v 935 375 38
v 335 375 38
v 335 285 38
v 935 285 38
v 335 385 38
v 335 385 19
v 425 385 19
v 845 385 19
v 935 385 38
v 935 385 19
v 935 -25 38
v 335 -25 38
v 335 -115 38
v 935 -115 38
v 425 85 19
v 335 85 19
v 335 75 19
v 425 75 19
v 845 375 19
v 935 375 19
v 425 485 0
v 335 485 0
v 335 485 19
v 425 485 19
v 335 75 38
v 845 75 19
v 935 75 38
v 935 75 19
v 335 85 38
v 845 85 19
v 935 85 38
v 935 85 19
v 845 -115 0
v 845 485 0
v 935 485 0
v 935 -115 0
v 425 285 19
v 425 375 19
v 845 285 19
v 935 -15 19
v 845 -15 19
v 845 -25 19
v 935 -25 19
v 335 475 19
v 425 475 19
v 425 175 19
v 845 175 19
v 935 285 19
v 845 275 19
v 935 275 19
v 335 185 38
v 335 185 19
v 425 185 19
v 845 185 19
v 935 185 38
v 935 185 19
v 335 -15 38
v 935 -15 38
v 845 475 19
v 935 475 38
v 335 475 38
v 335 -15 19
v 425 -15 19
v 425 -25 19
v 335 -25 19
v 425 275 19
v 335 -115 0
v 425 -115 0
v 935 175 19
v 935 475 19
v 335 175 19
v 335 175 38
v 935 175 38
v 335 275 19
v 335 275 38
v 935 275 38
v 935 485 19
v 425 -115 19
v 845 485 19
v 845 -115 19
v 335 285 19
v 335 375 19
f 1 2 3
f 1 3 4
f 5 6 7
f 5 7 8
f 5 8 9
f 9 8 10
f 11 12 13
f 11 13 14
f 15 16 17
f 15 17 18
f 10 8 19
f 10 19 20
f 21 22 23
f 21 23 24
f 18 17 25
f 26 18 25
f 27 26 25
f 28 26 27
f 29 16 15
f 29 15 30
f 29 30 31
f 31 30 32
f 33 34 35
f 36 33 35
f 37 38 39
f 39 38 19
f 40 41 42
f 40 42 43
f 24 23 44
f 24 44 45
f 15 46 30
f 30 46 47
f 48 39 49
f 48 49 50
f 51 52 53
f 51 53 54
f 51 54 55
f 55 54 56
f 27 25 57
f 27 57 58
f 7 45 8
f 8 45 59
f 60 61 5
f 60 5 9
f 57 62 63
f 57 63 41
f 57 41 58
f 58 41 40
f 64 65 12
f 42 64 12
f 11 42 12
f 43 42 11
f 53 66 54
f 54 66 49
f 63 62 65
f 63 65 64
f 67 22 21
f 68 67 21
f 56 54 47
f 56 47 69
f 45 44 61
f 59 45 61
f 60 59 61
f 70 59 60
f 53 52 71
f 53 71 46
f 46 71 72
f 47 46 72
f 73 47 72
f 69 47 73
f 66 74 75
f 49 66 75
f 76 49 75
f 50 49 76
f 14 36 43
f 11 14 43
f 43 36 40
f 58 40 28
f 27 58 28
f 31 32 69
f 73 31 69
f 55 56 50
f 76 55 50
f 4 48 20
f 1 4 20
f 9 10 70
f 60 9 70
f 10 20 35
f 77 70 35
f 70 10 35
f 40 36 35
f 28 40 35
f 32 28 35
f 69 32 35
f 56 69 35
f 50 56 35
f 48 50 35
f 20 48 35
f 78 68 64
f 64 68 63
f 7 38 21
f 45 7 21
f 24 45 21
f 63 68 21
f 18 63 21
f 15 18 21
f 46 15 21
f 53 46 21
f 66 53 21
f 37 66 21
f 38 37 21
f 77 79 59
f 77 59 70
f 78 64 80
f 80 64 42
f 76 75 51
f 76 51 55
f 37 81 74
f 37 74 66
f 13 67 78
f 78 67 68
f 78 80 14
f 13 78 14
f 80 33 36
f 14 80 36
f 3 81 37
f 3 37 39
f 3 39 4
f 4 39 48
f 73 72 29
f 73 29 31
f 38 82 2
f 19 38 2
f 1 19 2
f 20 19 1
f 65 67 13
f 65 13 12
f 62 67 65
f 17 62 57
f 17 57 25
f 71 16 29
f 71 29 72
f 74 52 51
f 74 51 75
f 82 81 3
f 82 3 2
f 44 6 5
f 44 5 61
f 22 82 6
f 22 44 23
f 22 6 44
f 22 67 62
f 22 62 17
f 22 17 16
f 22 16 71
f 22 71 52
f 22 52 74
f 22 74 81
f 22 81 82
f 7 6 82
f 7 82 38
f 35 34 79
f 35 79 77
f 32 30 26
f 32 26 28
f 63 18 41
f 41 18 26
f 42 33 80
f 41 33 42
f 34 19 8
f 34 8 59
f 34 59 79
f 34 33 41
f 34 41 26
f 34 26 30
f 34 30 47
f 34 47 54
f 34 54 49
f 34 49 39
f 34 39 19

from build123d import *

# Parameters (mm, degrees)
BOX077_W     = 600
BOX077_H     = 90
BOX077_DEPTH = 19
BOX076_W     = 600
BOX076_H     = 90
BOX076_DEPTH = 19
BOX082_W     = 90
BOX082_H     = 600
BOX082_DEPTH = 19
BOX079_W     = 600
BOX079_H     = 90
BOX079_DEPTH = 19
BOX078_W     = 600
BOX078_H     = 90
BOX078_DEPTH = 19
BOX081_W     = 600
BOX081_H     = 90
BOX081_DEPTH = 19
BOX080_W     = 600
BOX080_H     = 90
BOX080_DEPTH = 19
BOX083_W     = 90
BOX083_H     = 600
BOX083_DEPTH = 19


with BuildPart() as cube049:
    # Box077 → Box077 (new body)
    with BuildSketch(Plane(origin=(0, 100, 0), x_dir=(1, 0, 0), z_dir=(0, 0, 1))):
        with Locations((300, 45)):
            Rectangle(BOX077_W, BOX077_H)
    extrude(amount=BOX077_DEPTH)


with BuildPart() as cube048:
    # Box076 → Box076 (new body)
    with BuildSketch(Plane.XY):
        with Locations((300, 45)):
            Rectangle(BOX076_W, BOX076_H)
    extrude(amount=BOX076_DEPTH)


with BuildPart() as cube054:
    # Box082 → Box082 (new body)
    with BuildSketch(Plane.XY.offset(-19)):
        with Locations((45, 300)):
            Rectangle(BOX082_W, BOX082_H)
    extrude(amount=BOX082_DEPTH)


with BuildPart() as cube051:
    # Box079 → Box079 (new body)
    with BuildSketch(Plane(origin=(0, 300, 0), x_dir=(1, 0, 0), z_dir=(0, 0, 1))):
        with Locations((300, 45)):
            Rectangle(BOX079_W, BOX079_H)
    extrude(amount=BOX079_DEPTH)


with BuildPart() as cube050:
    # Box078 → Box078 (new body)
    with BuildSketch(Plane(origin=(0, 200, 0), x_dir=(1, 0, 0), z_dir=(0, 0, 1))):
        with Locations((300, 45)):
            Rectangle(BOX078_W, BOX078_H)
    extrude(amount=BOX078_DEPTH)


with BuildPart() as cube053:
    # Box081 → Box081 (new body)
    with BuildSketch(Plane(origin=(0, 500, 0), x_dir=(1, 0, 0), z_dir=(0, 0, 1))):
        with Locations((300, 45)):
            Rectangle(BOX081_W, BOX081_H)
    extrude(amount=BOX081_DEPTH)


with BuildPart() as cube052:
    # Box080 → Box080 (new body)
    with BuildSketch(Plane(origin=(0, 400, 0), x_dir=(1, 0, 0), z_dir=(0, 0, 1))):
        with Locations((300, 45)):
            Rectangle(BOX080_W, BOX080_H)
    extrude(amount=BOX080_DEPTH)


with BuildPart() as tuintegel_60x60:
    # Box083 → Box083 (new body)
    with BuildSketch(Plane(origin=(510, 0, -19), x_dir=(1, 0, 0), z_dir=(0, 0, 1))):
        with Locations((45, 300)):
            Rectangle(BOX083_W, BOX083_H)
    extrude(amount=BOX083_DEPTH)

    # Fusion014: union Cube049, Cube048, Cube054, Cube051, Cube050, Cube053, Cube052
    add(cube049.part)
    add(cube048.part)
    add(cube054.part)
    add(cube051.part)
    add(cube050.part)
    add(cube053.part)
    add(cube052.part)


with BuildPart() as tuintegel_60x60_1:
    # Fusion014 placement: moved
    add(tuintegel_60x60.part.moved(Location((335, -115, 19))))


solid = tuintegel_60x60_1.part
